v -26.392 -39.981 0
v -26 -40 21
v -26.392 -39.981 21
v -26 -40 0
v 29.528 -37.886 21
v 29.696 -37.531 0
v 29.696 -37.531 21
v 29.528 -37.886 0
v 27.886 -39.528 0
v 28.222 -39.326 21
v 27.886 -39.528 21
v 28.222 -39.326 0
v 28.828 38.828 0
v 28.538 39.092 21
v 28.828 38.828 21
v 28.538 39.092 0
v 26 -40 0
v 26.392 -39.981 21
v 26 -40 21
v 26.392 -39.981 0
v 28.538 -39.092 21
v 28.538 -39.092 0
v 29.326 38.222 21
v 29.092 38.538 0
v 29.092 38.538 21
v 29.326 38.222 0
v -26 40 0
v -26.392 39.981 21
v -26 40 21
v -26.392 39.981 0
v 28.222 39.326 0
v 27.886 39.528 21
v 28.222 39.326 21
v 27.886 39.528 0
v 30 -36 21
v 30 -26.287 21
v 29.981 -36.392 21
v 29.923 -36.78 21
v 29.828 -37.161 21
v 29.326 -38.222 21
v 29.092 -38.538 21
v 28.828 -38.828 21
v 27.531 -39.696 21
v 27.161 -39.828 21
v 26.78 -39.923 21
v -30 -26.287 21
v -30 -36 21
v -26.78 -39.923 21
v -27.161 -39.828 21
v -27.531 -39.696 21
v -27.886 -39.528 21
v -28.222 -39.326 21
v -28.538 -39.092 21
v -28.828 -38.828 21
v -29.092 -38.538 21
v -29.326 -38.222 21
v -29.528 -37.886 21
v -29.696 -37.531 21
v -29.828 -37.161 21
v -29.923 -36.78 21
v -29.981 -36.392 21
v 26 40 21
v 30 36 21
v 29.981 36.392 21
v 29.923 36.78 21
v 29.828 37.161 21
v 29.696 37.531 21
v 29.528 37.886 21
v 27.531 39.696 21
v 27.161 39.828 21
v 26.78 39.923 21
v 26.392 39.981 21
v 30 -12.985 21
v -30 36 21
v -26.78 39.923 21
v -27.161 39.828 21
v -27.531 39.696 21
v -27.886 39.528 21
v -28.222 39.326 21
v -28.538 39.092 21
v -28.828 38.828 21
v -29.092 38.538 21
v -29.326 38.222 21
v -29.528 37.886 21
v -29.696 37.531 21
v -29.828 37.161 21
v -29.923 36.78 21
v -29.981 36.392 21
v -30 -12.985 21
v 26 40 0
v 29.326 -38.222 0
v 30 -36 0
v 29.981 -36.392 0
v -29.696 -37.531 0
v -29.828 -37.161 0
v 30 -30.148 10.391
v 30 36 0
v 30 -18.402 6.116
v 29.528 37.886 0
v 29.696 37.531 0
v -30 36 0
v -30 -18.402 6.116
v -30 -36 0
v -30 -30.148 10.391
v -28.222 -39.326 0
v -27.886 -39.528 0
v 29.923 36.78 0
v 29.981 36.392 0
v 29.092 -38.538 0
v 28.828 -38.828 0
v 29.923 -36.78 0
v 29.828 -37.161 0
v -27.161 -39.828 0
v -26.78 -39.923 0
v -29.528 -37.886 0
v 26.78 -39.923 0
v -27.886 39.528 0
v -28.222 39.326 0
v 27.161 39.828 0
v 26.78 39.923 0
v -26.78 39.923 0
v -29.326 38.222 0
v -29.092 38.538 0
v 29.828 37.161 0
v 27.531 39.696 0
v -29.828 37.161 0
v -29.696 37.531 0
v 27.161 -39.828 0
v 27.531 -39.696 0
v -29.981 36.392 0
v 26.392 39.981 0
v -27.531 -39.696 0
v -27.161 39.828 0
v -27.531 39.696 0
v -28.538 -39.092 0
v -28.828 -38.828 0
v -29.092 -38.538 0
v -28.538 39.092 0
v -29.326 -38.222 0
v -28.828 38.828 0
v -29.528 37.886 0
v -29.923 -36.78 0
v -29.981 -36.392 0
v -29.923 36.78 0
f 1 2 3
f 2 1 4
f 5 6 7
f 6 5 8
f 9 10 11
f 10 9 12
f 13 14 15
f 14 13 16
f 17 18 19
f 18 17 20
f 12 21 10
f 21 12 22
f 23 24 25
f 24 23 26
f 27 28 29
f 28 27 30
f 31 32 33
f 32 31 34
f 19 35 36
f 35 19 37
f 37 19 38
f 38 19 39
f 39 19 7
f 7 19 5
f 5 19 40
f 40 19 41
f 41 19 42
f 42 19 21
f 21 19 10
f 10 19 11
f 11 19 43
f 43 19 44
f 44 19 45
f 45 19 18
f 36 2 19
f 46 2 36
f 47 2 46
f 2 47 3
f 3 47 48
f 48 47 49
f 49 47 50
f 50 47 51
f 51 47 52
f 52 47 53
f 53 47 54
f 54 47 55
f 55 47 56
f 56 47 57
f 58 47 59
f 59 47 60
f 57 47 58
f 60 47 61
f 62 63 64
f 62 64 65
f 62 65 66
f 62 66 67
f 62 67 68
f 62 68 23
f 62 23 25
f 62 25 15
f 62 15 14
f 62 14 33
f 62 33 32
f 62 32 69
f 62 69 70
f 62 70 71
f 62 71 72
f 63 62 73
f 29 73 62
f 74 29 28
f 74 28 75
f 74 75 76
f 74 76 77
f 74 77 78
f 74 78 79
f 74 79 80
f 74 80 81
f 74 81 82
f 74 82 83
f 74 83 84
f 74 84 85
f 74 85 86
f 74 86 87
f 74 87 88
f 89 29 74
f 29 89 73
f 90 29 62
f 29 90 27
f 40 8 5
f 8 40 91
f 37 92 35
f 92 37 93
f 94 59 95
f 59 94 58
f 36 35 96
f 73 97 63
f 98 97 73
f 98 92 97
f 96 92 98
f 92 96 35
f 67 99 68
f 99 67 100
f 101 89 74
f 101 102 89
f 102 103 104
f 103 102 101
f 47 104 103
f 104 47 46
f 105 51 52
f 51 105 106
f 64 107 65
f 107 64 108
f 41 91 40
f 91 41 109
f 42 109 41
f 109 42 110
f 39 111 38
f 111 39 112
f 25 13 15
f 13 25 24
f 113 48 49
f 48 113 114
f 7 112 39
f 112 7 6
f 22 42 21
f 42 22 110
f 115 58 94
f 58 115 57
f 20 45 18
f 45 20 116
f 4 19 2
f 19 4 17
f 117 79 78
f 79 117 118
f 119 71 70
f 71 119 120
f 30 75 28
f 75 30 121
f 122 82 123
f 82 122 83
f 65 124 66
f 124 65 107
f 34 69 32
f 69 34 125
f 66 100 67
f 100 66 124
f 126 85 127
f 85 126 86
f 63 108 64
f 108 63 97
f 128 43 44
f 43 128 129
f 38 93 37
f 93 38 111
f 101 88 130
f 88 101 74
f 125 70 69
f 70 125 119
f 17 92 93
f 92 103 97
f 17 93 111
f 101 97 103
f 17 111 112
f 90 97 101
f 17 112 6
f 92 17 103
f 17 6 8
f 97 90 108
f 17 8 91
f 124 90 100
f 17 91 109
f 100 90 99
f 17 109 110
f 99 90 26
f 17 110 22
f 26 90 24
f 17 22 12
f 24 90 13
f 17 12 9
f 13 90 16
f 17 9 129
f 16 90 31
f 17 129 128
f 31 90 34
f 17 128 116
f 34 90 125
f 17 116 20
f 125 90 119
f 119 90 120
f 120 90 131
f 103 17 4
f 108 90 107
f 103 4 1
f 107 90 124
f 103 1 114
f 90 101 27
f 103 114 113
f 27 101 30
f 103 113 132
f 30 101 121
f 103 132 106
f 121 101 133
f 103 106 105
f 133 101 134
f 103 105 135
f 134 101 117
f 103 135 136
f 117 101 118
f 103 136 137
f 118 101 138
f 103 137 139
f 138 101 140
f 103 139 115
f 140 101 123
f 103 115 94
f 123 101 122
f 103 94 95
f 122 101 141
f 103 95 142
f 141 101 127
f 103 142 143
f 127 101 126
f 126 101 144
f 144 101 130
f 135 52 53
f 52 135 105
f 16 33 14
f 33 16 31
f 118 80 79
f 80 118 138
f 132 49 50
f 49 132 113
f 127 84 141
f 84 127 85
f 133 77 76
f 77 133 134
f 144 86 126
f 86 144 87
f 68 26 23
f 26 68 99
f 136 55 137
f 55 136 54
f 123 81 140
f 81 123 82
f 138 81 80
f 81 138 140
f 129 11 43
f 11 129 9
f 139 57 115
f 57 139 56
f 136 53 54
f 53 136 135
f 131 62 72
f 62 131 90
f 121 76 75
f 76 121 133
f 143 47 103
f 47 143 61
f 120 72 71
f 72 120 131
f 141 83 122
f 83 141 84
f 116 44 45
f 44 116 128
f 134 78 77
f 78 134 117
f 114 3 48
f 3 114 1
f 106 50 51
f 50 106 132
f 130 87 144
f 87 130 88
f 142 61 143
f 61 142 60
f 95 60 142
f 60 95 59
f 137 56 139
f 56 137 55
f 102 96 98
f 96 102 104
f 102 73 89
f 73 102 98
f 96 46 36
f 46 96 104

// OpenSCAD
// License: Creative Commons Attribution-ShareAlike 4.0 International
// License URL: http://creativecommons.org/licenses/by-sa/4.0/

// Customizable phone stand

Width = 60;       // [40:100]
Length = 80;      // [40:100]
Height = 20;      // [20:40]
GapSize = 12.5;   // [8:15]
GapDistance = 20; // [15:30]
GapAngle = 20;    // [15:25]

$fn = $preview ? 32 : 64;

module Base(width, length, height)
{
    difference()
    {
        minkowski()
        {
            translate([ 4, 4, 0 ])
            {
                cube([ width - 8, length - 8, height ]);
            }
            cylinder(r = 4, h = 1);
        }
    }
}

module Cutout(angle, size, width, distance)
{
    rotate(a = angle, v = [ -1, 0, 0 ])
    {
        translate([ -1, -size / 2, -size ])
        {
            cube([ width + 2, size, 100 ]);
        }
    }
}

module PhoneStand(width = Width, length = Length, height = Height, gapSize = GapSize, gapDistance = GapDistance,
                  gapAngle = GapAngle, center = true)
{
    offset = center ? [ -width / 2, -length / 2, 0 ] : [ 0, 0, 0 ];
    translate(offset)
    {
        difference()
        {
            Base(width, length, height);
            translate([ 0, GapDistance, Height ])
            {
                Cutout(gapAngle, gapSize, width, gapDistance);
            }
        }
    }
}

PhoneStand();
